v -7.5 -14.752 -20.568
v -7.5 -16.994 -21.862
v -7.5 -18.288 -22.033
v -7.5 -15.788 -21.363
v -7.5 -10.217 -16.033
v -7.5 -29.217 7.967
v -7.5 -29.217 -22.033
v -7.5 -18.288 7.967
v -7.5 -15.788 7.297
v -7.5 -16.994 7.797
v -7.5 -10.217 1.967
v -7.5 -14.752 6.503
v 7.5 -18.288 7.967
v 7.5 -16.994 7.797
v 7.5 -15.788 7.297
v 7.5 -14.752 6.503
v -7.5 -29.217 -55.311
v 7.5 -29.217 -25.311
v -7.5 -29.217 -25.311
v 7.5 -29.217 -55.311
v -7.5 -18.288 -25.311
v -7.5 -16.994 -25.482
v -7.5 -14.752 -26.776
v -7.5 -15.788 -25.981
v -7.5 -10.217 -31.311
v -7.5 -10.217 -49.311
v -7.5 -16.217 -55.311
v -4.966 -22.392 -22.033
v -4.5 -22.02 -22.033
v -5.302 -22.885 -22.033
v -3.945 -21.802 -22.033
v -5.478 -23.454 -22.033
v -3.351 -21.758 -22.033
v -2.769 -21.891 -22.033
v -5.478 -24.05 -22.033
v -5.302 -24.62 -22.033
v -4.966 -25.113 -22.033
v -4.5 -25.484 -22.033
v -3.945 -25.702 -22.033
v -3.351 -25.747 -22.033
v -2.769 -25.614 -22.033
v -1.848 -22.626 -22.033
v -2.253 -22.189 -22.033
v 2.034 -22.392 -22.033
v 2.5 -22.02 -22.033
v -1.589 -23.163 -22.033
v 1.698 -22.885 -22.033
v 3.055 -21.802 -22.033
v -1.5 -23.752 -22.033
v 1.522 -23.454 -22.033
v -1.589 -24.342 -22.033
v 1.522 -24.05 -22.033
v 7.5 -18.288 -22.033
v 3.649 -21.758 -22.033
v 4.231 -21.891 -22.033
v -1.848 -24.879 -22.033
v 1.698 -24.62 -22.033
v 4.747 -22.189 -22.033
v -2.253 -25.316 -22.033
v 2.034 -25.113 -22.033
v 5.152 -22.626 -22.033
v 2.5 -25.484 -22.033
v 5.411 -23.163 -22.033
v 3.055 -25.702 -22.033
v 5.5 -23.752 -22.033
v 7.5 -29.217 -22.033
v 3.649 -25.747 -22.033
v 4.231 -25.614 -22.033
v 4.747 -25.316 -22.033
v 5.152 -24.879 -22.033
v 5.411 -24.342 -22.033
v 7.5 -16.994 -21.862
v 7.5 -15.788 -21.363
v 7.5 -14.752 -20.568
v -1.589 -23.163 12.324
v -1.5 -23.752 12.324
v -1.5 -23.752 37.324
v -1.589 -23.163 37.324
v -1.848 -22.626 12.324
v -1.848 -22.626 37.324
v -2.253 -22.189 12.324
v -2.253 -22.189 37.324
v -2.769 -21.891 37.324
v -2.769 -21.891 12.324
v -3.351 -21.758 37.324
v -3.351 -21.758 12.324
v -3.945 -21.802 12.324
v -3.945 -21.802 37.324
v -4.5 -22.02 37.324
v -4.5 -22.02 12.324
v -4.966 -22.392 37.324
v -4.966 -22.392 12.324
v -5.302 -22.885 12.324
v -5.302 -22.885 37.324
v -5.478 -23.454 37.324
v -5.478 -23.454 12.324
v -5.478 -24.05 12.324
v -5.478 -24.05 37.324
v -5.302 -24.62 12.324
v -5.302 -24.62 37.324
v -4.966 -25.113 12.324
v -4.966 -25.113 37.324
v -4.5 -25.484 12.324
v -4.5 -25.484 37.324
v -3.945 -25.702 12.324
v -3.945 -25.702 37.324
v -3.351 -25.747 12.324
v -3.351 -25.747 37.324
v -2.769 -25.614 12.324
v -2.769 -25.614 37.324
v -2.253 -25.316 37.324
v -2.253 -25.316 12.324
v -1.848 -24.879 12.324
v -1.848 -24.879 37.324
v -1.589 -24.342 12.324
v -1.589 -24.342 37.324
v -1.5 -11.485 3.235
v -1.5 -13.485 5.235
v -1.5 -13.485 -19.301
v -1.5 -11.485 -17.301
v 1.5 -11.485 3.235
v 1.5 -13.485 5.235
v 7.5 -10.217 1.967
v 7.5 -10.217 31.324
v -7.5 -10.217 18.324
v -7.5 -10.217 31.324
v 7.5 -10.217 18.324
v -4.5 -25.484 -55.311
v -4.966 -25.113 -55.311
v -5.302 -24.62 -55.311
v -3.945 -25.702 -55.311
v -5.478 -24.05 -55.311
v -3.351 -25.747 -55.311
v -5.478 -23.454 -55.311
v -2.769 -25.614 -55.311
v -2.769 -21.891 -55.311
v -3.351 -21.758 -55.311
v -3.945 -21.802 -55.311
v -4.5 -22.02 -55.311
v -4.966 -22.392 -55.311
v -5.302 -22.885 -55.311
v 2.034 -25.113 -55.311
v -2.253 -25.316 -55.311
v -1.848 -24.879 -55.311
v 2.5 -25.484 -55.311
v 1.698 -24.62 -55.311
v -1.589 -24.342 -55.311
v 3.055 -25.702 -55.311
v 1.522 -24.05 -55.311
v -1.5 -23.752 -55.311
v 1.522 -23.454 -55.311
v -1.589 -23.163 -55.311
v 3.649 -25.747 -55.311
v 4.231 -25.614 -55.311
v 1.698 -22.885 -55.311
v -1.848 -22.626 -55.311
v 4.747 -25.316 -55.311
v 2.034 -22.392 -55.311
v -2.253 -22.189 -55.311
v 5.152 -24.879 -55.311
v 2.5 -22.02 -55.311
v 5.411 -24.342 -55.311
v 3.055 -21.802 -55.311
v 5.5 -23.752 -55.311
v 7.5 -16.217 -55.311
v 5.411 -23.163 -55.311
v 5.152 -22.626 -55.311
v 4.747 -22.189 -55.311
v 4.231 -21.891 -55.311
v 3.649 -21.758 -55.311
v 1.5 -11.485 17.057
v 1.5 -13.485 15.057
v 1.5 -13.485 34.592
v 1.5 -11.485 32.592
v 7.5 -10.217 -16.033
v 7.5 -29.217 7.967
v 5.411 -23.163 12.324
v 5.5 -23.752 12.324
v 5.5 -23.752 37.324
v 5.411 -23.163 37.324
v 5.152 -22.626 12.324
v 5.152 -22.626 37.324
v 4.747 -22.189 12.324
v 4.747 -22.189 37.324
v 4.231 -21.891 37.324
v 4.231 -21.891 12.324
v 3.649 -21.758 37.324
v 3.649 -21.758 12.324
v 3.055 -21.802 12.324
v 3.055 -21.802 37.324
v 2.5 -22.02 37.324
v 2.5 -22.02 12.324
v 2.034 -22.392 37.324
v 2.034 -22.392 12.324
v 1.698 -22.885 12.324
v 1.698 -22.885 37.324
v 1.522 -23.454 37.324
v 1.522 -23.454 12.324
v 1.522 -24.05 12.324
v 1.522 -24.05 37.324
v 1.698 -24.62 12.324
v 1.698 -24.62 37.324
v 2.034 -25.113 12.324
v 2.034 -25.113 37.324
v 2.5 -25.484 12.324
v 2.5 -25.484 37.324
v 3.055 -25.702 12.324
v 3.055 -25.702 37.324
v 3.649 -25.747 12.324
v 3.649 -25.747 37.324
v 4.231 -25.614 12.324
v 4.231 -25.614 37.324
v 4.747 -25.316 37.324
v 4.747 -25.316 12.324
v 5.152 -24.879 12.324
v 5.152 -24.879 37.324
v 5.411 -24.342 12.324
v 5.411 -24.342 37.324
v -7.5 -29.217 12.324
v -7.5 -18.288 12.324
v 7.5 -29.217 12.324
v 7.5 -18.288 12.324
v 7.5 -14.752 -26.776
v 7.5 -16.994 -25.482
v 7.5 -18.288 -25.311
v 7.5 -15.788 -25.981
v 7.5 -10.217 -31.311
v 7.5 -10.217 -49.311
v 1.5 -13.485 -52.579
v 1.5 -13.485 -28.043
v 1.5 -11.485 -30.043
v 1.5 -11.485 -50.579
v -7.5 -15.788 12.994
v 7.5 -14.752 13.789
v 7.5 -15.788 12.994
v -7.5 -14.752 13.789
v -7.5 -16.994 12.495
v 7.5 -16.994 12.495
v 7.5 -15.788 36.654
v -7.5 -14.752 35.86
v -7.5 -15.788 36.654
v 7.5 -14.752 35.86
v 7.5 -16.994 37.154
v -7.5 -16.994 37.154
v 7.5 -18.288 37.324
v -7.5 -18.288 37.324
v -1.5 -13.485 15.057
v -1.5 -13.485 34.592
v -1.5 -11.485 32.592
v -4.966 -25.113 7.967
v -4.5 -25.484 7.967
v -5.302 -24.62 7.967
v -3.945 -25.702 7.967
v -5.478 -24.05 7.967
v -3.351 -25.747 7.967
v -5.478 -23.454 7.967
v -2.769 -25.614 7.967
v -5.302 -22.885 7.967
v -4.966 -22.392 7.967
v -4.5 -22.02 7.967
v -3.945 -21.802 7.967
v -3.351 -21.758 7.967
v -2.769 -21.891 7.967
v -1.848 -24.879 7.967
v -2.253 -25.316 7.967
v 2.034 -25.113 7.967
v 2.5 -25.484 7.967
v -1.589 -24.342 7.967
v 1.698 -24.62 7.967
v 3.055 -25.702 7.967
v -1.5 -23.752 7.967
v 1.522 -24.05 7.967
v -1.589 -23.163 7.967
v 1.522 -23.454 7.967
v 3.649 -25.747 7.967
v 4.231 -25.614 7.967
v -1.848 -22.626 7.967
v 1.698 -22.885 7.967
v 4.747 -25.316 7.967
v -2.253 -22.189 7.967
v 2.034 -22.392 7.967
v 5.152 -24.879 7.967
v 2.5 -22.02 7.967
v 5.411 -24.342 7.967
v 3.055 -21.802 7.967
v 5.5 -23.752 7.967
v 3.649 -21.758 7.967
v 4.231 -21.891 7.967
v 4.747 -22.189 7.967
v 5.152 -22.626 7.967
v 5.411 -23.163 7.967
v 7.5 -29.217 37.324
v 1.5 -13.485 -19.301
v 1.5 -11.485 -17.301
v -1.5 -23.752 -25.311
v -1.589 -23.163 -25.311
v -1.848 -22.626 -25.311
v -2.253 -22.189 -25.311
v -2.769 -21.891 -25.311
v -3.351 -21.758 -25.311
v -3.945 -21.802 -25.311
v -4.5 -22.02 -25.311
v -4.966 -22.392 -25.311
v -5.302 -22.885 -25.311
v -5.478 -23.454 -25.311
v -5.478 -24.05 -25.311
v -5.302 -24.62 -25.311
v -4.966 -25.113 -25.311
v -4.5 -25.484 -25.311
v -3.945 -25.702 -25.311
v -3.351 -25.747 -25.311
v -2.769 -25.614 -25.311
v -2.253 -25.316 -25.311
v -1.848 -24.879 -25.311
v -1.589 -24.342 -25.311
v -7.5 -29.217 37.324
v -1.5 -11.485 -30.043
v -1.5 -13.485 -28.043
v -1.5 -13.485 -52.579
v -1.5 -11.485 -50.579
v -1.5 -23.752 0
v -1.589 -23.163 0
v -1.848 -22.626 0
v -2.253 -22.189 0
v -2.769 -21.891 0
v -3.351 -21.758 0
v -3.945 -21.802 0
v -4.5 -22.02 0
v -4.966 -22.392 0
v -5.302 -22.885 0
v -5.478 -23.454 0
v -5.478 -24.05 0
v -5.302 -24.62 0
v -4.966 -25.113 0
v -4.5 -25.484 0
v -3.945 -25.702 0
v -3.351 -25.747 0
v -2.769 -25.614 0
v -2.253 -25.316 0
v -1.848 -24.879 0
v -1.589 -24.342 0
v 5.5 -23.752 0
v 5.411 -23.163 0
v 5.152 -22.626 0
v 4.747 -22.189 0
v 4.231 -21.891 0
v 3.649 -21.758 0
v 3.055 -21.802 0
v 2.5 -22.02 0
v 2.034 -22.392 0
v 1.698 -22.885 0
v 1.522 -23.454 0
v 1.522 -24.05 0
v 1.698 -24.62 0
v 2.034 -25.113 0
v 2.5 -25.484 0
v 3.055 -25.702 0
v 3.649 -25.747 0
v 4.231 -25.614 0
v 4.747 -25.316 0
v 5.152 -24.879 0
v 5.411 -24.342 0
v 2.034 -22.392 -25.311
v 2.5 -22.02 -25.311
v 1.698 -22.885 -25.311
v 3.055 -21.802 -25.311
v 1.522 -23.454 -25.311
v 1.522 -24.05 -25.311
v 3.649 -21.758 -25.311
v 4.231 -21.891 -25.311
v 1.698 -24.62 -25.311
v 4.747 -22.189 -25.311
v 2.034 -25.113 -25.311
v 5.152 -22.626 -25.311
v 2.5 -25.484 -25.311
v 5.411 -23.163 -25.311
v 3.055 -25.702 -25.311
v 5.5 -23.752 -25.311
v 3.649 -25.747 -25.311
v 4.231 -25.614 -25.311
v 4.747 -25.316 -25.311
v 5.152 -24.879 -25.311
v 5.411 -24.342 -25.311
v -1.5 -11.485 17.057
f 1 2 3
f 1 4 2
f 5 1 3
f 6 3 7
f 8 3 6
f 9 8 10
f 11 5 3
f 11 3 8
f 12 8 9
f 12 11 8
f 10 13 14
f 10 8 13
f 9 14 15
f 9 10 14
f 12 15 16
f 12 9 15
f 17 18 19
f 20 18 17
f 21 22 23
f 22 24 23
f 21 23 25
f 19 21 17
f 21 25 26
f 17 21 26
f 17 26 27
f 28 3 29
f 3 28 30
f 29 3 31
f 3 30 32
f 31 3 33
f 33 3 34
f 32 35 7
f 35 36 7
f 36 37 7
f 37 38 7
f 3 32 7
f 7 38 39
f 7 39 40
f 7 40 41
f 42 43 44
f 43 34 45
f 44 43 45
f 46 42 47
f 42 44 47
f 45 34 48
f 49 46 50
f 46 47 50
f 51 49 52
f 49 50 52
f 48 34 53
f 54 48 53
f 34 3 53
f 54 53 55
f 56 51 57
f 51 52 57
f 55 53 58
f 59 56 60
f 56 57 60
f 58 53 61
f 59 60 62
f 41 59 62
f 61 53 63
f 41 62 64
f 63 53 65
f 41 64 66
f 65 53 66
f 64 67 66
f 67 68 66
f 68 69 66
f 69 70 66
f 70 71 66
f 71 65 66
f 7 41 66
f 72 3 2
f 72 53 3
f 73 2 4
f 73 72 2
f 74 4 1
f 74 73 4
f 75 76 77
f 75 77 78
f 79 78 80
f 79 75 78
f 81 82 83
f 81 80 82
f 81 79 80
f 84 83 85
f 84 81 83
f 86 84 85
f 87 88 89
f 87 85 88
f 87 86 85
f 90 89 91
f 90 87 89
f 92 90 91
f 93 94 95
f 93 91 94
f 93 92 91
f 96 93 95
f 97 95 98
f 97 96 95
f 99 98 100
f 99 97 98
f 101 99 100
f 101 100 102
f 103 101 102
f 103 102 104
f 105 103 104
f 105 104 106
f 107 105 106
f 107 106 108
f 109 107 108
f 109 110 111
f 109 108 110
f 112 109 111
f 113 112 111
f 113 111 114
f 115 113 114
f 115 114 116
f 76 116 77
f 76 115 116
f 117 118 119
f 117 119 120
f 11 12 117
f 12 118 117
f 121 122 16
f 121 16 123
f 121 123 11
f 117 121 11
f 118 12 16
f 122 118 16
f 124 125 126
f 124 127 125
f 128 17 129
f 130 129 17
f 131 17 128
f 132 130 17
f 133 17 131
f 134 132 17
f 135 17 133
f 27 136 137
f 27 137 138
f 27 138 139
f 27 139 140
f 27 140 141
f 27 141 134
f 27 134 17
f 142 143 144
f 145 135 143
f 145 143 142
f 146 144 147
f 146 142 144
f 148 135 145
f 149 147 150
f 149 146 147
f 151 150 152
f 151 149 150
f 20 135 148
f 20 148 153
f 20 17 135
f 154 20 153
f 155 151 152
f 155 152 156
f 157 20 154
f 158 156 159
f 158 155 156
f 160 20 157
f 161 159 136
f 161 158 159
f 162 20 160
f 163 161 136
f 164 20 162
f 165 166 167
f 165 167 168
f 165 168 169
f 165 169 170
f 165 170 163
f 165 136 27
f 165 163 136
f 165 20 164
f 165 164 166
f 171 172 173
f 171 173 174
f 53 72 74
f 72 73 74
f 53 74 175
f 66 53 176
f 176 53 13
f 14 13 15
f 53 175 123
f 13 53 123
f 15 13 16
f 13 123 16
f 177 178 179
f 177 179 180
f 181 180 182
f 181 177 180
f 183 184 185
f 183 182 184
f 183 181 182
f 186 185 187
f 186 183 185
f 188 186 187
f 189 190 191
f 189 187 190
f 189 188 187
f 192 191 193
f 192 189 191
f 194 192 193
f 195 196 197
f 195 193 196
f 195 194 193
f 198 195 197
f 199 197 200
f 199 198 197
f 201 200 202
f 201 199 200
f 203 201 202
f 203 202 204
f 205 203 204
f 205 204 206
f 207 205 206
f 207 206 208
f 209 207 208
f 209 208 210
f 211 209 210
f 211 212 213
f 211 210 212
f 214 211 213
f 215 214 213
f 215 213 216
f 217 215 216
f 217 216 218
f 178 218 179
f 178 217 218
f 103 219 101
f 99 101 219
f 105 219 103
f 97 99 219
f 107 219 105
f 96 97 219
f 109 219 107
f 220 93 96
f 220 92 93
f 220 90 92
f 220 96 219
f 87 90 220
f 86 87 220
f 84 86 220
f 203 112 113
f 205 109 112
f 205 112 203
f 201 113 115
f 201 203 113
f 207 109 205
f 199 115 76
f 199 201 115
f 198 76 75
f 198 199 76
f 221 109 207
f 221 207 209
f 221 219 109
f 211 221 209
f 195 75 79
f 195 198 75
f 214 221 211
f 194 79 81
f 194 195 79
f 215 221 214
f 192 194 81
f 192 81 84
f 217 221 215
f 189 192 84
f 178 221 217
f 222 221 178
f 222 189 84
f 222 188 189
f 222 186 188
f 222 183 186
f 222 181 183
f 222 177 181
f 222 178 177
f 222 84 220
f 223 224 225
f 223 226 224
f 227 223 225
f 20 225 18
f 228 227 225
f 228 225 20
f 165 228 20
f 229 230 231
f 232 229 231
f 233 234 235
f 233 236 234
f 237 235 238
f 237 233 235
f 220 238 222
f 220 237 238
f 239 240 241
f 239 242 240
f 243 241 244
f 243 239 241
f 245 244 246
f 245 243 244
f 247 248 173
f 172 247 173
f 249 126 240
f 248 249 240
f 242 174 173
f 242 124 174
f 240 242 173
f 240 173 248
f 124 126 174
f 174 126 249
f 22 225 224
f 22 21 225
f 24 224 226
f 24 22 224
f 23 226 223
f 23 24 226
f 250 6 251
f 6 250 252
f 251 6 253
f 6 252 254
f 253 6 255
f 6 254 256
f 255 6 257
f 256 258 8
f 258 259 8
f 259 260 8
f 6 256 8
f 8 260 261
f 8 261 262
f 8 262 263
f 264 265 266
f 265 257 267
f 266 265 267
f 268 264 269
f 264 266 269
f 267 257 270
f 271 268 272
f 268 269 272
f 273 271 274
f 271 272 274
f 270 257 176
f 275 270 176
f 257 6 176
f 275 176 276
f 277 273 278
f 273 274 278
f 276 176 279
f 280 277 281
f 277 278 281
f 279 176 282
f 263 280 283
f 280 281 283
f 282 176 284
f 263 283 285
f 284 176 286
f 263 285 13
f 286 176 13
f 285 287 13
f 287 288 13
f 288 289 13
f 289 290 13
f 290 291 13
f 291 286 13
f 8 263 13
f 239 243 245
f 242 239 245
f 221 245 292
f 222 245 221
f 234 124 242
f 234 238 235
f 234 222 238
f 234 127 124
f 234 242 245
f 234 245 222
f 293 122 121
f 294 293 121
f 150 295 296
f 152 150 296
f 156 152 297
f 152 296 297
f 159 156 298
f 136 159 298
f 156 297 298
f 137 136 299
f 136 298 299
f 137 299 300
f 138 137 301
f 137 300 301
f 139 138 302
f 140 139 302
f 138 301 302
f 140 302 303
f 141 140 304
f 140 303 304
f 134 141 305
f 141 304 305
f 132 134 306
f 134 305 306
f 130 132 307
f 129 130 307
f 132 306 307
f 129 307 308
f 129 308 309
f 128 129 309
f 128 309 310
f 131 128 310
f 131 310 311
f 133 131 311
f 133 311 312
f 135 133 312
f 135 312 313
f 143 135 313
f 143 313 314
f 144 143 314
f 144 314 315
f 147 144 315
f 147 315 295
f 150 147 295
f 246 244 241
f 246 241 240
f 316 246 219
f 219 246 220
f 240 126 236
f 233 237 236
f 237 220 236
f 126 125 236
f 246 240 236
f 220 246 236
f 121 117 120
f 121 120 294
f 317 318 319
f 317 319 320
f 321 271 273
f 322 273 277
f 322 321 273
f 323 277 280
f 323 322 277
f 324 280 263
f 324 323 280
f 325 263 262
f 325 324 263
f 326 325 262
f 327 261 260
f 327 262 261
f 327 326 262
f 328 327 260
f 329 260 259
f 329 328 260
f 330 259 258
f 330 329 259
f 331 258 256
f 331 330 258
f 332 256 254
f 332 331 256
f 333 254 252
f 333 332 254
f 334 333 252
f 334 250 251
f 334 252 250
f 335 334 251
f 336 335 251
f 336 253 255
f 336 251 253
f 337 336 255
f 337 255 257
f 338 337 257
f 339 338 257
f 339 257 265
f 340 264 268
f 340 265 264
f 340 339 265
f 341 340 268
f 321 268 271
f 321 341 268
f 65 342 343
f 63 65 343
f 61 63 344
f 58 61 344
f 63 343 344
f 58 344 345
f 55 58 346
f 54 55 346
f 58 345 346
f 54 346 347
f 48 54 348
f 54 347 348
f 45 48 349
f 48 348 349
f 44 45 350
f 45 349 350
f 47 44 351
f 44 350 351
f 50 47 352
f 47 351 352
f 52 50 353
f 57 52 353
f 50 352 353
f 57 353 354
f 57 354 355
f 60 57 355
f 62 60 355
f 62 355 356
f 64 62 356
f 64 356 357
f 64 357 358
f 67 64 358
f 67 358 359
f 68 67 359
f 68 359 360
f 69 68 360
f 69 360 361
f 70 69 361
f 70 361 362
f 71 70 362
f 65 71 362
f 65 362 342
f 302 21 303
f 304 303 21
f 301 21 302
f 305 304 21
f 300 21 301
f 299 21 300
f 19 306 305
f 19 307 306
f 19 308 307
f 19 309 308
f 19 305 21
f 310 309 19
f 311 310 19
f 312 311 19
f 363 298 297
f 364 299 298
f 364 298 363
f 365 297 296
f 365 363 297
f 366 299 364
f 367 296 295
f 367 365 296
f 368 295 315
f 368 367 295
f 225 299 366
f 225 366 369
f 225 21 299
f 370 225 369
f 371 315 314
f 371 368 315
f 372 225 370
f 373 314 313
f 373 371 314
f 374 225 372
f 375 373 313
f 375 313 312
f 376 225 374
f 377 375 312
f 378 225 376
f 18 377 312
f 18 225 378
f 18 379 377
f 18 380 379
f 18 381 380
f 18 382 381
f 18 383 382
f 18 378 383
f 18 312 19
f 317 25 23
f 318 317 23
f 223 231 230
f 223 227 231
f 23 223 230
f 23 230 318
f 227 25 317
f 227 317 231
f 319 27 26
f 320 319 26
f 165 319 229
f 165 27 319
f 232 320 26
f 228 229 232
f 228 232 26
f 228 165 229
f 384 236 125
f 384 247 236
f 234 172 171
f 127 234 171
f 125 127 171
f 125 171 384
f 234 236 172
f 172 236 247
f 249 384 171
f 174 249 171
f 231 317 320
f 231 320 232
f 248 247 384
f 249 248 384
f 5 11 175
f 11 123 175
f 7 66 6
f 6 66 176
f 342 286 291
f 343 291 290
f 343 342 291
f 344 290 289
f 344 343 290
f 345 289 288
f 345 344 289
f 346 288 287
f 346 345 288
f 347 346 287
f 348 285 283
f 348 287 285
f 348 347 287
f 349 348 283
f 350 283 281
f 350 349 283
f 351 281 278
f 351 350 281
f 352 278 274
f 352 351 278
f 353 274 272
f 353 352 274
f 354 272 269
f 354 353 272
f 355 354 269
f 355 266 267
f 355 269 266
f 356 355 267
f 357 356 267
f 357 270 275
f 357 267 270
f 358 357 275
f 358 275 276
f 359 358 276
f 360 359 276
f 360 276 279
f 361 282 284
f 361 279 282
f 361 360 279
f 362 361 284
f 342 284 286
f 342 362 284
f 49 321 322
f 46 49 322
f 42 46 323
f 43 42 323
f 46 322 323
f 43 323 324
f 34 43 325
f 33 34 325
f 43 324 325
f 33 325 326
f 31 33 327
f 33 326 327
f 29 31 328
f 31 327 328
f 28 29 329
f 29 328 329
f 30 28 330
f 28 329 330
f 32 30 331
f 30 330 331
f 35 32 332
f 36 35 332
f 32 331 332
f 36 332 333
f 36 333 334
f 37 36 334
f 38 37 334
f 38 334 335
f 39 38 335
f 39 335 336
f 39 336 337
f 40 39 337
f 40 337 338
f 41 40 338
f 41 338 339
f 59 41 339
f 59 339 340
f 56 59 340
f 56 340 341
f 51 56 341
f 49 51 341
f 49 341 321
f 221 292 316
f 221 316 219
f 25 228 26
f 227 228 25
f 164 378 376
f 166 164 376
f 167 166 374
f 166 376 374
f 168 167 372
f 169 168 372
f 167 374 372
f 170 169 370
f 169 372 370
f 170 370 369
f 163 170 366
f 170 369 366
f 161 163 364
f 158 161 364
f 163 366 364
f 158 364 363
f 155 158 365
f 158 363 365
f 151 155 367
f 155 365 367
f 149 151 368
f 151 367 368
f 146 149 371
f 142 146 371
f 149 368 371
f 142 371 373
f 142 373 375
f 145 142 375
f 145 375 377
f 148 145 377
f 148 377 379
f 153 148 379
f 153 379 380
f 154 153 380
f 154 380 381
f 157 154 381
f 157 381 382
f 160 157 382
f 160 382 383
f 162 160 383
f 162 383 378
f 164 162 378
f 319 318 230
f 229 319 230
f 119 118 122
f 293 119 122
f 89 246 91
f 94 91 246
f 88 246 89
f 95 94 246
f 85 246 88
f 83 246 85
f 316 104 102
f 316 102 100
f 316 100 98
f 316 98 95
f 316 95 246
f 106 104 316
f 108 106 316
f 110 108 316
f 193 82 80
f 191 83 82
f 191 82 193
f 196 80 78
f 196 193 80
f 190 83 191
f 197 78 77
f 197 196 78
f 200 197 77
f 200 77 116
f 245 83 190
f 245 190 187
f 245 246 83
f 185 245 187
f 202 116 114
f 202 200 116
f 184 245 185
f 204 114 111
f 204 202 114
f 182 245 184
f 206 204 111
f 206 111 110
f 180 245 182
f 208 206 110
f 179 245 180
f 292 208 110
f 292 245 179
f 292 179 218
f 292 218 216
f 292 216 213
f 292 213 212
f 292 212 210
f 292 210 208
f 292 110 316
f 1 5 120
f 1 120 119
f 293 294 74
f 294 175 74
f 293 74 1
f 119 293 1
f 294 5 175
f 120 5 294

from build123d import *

# Parameters (mm, degrees)
BOSS_EXTRUDE1_DEPTH = 7.5
BOSS_EXTRUDE2_DEPTH = 7.5
BOSS_EXTRUDE3_DEPTH = 7.5
FILLET1_R           = 5
FILLET2_R           = 5
FILLET3_R           = 5
SKETCH4_R           = 2
SKETCH4_W           = 3
SKETCH4_H           = 2
CUT_EXTRUDE1_DEPTH  = 100


with BuildPart() as part:
    # Sketch1 → Boss-Extrude1 (new, symmetric)
    with BuildSketch(Plane(origin=(0, 0, 0), x_dir=(0, 0, -1), z_dir=(1, 0, 0))):
        Polygon((-31.324369962, -10.21673477), (-37.324369962, -16.21673477), (-37.324369962, -29.21673477), (-12.324369962, -29.21673477), (-12.324369962, -16.21673477), (-18.324369962, -10.21673477), align=None)
    extrude(amount=BOSS_EXTRUDE1_DEPTH, both=True)

    # Fillet3
    fillet3_edges = [part.edges().sort_by_distance(p)[0] for p in [
        (0, -16.21673477, 12.324369962),
        (0, -16.21673477, 37.324369962),
    ]]
    fillet(fillet3_edges, radius=FILLET3_R)


with BuildPart() as body_2:
    # Sketch2 → Boss-Extrude2 (new, symmetric)
    with BuildSketch(Plane(origin=(0, 0, 0), x_dir=(0, 0, -1), z_dir=(1, 0, 0))):
        Polygon((-7.967160281, -29.21673477), (-7.967160281, -16.21673477), (-1.967160281, -10.21673477), (16.032839719, -10.21673477), (22.032839719, -16.21673477), (22.032839719, -29.21673477), align=None)
    extrude(amount=BOSS_EXTRUDE2_DEPTH, both=True)

    # Fillet2
    fillet2_edges = [body_2.edges().sort_by_distance(p)[0] for p in [
        (0, -16.21673477, 7.967160281),
        (0, -16.21673477, -22.032839719),
    ]]
    fillet(fillet2_edges, radius=FILLET2_R)


with BuildPart() as body_3:
    # Sketch3 → Boss-Extrude3 (new, symmetric)
    with BuildSketch(Plane(origin=(0, 0, 0), x_dir=(0, 0, -1), z_dir=(1, 0, 0))):
        Polygon((25.31118522, -16.21673477), (25.31118522, -29.21673477), (55.31118522, -29.21673477), (55.31118522, -16.21673477), (49.31118522, -10.21673477), (31.31118522, -10.21673477), align=None)
    extrude(amount=BOSS_EXTRUDE3_DEPTH, both=True)

    # Fillet1
    fillet1_edges = [body_3.edges().sort_by_distance(p)[0] for p in [
        (0, -16.21673477, -25.31118522),
    ]]
    fillet(fillet1_edges, radius=FILLET1_R)


with BuildPart() as cut_extrude1_tool:
    # Sketch4 → Cut-Extrude1 (new, symmetric)
    with BuildSketch(Plane.XY):
        with Locations((-3.5, -23.752268676)):
            Circle(SKETCH4_R)
        with Locations((3.5, -23.752268676)):
            Circle(SKETCH4_R)
        with Locations((0, -12.484501723)):
            Rectangle(SKETCH4_W, SKETCH4_H)
    extrude(amount=CUT_EXTRUDE1_DEPTH, both=True)


with BuildPart() as part_1:
    add(part.part)

    # Cut-Extrude1: cut by cut_extrude1_tool
    add(cut_extrude1_tool.part, mode=Mode.SUBTRACT)


with BuildPart() as body_2_1:
    add(body_2.part)

    # Cut-Extrude1: cut by cut_extrude1_tool
    add(cut_extrude1_tool.part, mode=Mode.SUBTRACT)


with BuildPart() as body_3_1:
    add(body_3.part)

    # Cut-Extrude1: cut by cut_extrude1_tool
    add(cut_extrude1_tool.part, mode=Mode.SUBTRACT)


solid = Compound([part_1.part, body_2_1.part, body_3_1.part])
